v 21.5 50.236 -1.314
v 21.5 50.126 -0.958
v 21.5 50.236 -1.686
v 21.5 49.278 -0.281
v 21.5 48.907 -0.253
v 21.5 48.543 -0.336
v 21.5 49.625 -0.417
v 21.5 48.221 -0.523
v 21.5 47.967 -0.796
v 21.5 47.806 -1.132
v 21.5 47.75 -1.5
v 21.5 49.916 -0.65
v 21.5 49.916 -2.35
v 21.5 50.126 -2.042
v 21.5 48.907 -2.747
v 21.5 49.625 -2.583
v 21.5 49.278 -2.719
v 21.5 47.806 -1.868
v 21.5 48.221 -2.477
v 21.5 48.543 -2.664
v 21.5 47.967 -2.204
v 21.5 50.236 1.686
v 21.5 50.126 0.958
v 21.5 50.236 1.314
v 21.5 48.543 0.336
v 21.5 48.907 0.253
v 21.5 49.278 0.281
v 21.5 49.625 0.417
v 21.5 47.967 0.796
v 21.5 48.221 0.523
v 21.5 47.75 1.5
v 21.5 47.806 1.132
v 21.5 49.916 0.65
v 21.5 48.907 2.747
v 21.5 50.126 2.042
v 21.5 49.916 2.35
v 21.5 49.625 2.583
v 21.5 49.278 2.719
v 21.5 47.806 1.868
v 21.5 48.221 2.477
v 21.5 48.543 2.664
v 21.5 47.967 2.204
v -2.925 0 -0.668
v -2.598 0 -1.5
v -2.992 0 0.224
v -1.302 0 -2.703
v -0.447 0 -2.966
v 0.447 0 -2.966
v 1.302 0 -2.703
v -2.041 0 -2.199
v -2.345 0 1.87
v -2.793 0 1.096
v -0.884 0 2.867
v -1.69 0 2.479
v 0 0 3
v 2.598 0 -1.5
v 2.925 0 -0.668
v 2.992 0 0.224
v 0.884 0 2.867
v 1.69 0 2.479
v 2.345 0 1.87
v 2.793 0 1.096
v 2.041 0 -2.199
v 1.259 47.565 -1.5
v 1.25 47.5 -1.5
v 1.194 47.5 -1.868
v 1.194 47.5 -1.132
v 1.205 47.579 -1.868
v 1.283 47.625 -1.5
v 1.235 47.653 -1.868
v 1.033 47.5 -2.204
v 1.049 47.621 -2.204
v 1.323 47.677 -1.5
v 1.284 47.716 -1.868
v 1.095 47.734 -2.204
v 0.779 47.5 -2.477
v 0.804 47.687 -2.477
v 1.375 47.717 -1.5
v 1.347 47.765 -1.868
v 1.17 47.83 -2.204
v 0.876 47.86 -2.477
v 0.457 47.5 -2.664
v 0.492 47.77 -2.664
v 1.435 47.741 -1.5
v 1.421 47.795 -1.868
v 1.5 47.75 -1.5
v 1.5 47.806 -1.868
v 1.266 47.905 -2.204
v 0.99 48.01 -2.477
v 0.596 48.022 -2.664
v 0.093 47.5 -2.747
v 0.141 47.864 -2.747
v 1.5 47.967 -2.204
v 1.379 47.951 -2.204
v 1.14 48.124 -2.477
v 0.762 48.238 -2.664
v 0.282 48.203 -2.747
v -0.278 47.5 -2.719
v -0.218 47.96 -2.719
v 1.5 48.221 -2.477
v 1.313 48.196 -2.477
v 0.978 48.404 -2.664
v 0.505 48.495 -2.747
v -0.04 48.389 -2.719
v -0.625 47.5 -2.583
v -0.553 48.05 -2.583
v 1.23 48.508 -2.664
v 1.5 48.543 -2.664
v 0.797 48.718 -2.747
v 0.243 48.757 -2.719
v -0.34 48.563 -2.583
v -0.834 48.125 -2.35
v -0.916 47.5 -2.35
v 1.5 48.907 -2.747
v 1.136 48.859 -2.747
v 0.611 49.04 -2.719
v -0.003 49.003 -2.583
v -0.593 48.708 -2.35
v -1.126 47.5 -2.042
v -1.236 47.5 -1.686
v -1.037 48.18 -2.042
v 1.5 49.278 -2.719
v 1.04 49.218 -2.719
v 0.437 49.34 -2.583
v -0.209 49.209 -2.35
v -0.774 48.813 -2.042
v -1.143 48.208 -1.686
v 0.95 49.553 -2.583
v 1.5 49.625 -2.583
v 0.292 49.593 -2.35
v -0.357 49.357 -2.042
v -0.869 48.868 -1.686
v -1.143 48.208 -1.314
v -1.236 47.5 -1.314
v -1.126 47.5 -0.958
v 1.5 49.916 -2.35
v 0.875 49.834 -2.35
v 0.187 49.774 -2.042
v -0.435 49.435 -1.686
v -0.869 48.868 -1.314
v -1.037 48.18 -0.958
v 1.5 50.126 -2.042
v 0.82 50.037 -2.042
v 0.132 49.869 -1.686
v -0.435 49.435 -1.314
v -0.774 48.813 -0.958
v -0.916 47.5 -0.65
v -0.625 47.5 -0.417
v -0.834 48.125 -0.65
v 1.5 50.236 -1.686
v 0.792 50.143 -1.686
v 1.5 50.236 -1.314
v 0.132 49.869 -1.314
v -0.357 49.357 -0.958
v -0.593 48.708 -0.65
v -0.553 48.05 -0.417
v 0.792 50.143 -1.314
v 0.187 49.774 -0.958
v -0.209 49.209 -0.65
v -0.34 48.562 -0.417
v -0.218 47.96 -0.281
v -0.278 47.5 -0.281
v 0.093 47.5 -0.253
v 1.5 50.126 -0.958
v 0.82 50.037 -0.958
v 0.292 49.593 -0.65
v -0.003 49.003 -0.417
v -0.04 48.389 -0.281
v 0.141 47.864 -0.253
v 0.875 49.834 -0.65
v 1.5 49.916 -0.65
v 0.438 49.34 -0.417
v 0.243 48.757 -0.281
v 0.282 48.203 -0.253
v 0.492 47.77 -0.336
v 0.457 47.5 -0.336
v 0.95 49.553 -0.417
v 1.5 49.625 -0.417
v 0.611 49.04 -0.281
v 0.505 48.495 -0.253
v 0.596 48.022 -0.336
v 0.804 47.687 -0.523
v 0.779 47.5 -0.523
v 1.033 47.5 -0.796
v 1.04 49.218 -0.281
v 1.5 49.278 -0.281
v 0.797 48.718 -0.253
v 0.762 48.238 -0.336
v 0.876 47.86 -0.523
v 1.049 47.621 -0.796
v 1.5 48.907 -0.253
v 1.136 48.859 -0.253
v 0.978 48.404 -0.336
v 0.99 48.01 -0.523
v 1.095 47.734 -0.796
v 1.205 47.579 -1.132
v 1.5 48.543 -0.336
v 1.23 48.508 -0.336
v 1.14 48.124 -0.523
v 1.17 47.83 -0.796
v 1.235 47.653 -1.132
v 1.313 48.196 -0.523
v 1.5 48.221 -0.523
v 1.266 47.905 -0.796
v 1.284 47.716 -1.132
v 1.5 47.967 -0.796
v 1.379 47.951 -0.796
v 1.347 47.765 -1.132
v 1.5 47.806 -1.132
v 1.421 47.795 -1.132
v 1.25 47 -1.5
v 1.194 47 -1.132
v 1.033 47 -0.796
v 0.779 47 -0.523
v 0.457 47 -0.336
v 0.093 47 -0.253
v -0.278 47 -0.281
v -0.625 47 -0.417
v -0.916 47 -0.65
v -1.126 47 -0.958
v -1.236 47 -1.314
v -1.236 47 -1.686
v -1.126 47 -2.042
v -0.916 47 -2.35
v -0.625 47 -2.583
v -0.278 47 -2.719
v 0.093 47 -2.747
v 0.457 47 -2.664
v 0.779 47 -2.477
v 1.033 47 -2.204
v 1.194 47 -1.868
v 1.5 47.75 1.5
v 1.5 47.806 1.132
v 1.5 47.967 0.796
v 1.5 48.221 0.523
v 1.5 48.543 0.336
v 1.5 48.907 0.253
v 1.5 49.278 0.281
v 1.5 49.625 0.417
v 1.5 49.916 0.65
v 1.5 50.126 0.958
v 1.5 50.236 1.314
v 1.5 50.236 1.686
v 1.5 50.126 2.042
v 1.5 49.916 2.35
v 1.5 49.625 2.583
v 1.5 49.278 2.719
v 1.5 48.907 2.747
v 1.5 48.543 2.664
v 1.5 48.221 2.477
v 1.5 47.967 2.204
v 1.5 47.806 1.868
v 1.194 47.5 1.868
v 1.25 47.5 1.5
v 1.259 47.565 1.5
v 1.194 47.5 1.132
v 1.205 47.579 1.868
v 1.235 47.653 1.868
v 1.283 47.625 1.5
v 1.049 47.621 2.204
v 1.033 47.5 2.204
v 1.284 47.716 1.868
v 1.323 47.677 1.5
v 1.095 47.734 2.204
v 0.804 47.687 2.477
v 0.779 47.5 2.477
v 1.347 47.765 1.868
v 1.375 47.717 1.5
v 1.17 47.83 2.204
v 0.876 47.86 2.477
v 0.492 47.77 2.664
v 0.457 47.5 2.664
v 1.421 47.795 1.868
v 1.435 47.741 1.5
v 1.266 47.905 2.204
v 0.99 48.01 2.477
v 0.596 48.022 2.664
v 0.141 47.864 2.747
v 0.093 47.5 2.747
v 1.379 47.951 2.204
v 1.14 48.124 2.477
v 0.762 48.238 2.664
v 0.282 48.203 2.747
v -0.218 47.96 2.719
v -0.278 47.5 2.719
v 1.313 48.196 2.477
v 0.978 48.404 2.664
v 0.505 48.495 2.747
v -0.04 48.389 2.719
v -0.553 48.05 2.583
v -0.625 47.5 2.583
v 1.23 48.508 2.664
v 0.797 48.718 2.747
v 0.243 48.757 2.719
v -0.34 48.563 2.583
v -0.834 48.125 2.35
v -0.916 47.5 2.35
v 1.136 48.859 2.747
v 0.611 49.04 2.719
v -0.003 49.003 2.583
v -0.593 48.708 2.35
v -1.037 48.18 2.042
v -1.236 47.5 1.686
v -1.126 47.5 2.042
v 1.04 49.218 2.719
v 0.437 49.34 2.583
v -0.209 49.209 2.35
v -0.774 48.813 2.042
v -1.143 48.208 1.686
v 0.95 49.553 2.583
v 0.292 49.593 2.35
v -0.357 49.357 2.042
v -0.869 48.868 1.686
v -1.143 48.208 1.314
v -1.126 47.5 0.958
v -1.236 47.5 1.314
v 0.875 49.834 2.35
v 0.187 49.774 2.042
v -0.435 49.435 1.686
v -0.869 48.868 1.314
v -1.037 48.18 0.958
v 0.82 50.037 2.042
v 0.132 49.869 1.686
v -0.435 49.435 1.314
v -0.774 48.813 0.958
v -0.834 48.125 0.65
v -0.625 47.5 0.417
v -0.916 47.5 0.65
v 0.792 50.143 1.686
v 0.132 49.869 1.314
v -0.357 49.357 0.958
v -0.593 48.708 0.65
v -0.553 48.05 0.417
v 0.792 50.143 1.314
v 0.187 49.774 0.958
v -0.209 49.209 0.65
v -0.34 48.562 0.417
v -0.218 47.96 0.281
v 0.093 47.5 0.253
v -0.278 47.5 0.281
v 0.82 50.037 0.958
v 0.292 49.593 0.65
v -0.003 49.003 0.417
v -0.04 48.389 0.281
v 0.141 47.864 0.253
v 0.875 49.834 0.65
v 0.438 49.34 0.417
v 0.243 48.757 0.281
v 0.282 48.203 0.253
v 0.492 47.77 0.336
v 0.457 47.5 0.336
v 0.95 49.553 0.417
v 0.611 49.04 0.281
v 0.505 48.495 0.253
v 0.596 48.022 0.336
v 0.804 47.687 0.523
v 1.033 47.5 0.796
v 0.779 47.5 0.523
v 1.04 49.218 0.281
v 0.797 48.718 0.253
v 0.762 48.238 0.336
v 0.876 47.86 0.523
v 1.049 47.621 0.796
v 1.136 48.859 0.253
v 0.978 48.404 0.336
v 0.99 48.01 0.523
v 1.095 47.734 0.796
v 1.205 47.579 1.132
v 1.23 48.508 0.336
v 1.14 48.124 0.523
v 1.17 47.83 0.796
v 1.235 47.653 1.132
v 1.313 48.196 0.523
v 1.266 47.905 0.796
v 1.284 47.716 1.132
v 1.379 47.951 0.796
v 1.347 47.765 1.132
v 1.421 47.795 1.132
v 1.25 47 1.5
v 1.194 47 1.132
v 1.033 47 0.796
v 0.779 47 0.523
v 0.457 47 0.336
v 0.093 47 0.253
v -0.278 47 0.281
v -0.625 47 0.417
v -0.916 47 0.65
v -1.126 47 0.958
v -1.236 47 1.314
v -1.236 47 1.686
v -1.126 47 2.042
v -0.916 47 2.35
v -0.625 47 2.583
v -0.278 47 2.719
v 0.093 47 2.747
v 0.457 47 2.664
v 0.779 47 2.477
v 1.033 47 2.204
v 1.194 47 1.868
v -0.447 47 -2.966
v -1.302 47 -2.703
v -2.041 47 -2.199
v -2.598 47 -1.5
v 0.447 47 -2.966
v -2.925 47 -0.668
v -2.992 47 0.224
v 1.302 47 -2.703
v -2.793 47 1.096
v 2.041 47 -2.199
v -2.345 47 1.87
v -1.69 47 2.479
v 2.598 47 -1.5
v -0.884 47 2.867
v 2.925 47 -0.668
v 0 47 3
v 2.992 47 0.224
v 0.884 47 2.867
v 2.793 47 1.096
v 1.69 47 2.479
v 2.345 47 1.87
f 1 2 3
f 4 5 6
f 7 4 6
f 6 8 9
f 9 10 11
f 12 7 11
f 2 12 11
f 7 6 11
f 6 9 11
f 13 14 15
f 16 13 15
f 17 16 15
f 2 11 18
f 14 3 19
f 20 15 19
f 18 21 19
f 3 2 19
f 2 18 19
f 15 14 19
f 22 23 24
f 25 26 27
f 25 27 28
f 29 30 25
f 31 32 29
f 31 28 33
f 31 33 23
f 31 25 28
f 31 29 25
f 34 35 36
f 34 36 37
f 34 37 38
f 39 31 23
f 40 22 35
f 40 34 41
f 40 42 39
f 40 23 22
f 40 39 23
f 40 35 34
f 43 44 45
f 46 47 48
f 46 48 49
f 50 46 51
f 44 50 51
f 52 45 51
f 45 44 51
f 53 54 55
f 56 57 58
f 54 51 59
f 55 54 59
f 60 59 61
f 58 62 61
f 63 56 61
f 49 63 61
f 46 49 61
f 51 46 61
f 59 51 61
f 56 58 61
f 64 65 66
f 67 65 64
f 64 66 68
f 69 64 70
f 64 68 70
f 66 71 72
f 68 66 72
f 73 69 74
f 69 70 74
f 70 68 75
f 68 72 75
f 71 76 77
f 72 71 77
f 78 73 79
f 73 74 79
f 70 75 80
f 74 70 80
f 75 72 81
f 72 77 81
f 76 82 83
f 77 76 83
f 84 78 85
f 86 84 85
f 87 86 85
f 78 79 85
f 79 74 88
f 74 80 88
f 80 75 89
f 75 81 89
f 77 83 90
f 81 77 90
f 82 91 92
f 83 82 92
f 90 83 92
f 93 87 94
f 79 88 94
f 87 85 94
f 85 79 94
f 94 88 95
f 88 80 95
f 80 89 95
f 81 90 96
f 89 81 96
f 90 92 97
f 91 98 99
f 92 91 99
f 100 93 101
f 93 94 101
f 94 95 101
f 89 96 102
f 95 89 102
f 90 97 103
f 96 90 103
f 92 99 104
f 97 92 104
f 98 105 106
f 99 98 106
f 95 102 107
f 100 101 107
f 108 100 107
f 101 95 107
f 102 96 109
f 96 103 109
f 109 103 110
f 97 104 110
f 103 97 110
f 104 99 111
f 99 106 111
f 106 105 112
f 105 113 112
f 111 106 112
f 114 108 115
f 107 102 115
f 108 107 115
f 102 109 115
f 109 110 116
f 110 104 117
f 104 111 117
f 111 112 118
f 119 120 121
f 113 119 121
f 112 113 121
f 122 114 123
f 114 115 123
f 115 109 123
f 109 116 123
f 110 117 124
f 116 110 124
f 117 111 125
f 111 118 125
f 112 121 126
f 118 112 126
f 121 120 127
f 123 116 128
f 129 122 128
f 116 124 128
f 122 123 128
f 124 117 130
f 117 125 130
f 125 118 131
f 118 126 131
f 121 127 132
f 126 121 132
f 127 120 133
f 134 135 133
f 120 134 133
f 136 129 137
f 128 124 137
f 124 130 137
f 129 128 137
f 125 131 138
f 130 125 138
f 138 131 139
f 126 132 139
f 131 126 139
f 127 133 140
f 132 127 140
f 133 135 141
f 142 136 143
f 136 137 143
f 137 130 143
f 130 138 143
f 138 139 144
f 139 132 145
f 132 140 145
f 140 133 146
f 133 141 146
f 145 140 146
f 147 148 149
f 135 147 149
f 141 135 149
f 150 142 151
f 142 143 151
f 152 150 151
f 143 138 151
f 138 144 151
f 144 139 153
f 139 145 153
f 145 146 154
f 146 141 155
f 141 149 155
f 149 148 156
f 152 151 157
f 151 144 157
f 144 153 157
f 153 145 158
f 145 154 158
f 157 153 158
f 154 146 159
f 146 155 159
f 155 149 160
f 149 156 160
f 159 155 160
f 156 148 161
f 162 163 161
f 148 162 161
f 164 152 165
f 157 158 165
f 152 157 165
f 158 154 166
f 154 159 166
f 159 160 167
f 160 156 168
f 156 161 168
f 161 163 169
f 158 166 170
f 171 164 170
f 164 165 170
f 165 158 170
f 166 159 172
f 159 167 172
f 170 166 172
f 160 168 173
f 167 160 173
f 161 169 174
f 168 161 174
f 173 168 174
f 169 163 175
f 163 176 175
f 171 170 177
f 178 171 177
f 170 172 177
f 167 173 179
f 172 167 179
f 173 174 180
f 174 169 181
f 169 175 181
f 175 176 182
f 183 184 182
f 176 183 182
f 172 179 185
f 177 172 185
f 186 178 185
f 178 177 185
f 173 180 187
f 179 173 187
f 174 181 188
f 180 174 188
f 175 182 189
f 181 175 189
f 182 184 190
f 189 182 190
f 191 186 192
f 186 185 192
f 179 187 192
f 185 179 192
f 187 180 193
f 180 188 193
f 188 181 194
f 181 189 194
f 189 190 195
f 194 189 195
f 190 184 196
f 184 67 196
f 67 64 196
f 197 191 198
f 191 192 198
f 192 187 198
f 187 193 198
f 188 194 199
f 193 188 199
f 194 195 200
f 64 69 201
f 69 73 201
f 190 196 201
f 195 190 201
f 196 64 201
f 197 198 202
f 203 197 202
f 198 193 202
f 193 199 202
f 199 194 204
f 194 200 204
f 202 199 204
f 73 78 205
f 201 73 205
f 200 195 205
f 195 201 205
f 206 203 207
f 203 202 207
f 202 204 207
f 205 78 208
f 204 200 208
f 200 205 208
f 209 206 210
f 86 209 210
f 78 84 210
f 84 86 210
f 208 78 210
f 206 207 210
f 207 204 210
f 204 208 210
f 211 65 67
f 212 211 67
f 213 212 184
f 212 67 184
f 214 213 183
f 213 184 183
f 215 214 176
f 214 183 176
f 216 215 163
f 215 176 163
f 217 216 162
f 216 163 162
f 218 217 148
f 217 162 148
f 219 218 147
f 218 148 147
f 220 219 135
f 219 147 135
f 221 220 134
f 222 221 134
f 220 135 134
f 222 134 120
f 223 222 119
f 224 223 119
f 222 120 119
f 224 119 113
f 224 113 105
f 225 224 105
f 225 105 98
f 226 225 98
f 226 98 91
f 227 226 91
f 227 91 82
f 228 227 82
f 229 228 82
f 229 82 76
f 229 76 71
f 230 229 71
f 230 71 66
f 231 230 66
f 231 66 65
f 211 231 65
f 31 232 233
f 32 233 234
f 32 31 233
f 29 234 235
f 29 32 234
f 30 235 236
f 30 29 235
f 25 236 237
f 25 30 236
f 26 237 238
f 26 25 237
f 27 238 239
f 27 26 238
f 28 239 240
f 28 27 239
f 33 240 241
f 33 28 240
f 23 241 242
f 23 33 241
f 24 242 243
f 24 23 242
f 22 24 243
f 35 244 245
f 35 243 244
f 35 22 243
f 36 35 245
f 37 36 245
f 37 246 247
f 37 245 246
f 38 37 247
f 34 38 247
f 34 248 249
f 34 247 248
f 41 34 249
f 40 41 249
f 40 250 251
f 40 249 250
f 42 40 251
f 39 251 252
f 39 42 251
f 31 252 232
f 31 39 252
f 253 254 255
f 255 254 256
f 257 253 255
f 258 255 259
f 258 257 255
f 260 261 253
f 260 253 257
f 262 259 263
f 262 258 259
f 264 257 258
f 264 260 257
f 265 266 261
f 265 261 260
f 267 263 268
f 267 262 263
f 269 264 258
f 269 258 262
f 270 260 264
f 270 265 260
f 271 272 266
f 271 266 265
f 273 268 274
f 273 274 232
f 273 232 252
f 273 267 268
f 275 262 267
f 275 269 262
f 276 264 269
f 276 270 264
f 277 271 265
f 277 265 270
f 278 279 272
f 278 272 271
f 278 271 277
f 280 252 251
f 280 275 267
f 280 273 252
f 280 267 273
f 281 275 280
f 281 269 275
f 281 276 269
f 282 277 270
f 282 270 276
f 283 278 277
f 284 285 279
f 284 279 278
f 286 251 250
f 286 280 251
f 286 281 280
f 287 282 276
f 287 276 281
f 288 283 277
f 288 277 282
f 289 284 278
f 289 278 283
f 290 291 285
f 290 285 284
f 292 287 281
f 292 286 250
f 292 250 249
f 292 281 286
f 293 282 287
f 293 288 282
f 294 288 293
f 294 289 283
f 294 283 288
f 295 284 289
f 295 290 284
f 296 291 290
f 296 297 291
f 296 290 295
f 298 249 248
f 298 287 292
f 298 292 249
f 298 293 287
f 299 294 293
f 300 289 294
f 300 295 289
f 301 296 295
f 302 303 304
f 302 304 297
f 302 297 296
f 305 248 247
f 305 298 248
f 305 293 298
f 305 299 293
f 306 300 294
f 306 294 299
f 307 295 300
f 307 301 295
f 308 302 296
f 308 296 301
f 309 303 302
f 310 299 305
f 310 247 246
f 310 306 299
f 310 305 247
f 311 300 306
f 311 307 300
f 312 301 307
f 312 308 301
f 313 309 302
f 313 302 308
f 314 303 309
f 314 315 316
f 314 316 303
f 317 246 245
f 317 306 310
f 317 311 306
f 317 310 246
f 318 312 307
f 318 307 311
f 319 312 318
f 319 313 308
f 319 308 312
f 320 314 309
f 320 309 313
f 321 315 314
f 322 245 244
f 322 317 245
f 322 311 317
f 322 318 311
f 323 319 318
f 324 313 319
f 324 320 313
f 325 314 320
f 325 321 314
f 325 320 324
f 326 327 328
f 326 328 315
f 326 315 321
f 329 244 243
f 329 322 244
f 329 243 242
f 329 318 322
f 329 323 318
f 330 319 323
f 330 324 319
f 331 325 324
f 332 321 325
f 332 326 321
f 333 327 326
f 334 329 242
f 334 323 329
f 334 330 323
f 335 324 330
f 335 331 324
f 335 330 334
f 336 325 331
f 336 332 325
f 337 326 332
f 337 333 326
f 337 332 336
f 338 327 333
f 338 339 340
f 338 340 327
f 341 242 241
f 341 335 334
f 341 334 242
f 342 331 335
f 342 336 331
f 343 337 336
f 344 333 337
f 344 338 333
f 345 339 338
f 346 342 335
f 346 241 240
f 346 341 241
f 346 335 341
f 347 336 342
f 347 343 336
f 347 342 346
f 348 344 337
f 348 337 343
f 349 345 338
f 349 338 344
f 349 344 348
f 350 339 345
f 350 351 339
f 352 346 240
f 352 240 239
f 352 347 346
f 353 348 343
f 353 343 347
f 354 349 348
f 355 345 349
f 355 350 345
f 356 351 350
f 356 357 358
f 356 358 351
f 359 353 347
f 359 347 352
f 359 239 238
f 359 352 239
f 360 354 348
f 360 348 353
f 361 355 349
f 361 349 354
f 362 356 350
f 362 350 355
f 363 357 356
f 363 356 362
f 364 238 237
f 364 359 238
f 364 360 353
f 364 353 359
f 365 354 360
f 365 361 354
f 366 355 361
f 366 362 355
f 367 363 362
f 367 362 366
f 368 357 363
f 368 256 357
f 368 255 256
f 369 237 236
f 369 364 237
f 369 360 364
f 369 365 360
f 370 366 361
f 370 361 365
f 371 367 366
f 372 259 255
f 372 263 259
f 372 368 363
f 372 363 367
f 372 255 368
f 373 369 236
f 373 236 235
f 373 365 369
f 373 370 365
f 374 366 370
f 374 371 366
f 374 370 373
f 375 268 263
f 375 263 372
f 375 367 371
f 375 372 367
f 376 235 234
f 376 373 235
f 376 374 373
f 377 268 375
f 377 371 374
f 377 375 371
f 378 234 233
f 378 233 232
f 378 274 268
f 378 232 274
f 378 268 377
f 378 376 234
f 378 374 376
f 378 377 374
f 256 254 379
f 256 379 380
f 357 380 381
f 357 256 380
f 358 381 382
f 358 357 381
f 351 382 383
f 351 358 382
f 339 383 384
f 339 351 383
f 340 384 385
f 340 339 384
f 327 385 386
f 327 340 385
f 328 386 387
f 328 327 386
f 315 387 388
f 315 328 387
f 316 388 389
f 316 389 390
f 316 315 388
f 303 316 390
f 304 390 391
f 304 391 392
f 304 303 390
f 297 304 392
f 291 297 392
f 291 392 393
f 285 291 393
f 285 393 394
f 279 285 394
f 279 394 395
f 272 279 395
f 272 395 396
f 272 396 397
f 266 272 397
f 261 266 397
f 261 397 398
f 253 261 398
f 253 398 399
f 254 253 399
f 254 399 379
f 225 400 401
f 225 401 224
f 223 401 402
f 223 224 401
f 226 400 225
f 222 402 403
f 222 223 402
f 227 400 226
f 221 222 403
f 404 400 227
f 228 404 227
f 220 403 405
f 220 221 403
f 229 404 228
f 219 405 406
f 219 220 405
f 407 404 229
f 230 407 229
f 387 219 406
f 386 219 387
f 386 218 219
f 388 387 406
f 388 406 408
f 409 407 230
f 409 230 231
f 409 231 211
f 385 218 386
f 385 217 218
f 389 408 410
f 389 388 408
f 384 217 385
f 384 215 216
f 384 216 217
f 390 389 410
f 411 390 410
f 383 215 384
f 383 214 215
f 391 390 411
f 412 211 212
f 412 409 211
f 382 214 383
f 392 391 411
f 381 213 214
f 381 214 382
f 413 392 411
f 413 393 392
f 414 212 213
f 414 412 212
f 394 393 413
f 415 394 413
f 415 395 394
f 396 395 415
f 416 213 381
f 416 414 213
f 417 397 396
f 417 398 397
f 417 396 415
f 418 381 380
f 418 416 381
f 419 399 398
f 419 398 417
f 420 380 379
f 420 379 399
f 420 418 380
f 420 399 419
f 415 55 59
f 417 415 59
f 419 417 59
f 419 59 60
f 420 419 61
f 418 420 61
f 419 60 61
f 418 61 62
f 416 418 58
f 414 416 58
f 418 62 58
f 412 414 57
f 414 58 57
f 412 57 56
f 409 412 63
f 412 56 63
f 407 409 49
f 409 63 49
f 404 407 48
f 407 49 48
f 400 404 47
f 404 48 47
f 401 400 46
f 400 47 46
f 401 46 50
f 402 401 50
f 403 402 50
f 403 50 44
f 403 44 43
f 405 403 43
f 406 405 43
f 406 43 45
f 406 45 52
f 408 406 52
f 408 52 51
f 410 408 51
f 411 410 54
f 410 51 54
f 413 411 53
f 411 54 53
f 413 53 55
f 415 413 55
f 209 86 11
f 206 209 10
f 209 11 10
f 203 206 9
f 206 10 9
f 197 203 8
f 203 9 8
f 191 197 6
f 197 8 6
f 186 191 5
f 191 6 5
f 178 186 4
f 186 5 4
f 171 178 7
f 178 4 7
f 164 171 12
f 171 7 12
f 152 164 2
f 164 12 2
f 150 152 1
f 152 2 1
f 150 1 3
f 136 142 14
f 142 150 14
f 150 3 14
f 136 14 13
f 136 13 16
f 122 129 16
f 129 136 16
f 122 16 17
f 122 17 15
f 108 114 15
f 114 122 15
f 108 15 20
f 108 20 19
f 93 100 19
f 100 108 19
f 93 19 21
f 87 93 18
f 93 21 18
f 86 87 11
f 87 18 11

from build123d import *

# Parameters (mm, degrees)
SKETCH1_R           = 3
BOSS_EXTRUDE1_DEPTH = 47
SKETCH3_R           = 1.25


with BuildPart() as part:
    # Sketch1 → Boss-Extrude1 (new body)
    with BuildSketch(Plane(origin=(0, 0, 0), x_dir=(1, 0, 0), z_dir=(0, 1, 0))):
        with Locations(Location((0, 0, 0), (0, 0, 270))):
            Circle(SKETCH1_R)
    extrude(amount=BOSS_EXTRUDE1_DEPTH)

    # Sweep1: sweep along a path in Sketch2
    with BuildLine(Plane.XY.offset(1.5)) as sweep1_path:
        Line((0, 47), (0, 47.5))
        ThreePointArc((0, 47.5), (0.439339828, 48.560660172), (1.5, 49))
        Line((1.5, 49), (21.5, 49))
    # Sketch3 → Sweep1 (sweep)
    with BuildSketch(Plane(origin=(0, 47, 0), x_dir=(1, 0, 0), z_dir=(0, 1, 0))):
        with Locations((0, -1.5)):
            Circle(SKETCH3_R)
    sweep1 = sweep(path=sweep1_path.line)

    # Mirror1: Sweep1 across plane
    add(sweep1.mirror(Plane.XY))


solid = part.part
